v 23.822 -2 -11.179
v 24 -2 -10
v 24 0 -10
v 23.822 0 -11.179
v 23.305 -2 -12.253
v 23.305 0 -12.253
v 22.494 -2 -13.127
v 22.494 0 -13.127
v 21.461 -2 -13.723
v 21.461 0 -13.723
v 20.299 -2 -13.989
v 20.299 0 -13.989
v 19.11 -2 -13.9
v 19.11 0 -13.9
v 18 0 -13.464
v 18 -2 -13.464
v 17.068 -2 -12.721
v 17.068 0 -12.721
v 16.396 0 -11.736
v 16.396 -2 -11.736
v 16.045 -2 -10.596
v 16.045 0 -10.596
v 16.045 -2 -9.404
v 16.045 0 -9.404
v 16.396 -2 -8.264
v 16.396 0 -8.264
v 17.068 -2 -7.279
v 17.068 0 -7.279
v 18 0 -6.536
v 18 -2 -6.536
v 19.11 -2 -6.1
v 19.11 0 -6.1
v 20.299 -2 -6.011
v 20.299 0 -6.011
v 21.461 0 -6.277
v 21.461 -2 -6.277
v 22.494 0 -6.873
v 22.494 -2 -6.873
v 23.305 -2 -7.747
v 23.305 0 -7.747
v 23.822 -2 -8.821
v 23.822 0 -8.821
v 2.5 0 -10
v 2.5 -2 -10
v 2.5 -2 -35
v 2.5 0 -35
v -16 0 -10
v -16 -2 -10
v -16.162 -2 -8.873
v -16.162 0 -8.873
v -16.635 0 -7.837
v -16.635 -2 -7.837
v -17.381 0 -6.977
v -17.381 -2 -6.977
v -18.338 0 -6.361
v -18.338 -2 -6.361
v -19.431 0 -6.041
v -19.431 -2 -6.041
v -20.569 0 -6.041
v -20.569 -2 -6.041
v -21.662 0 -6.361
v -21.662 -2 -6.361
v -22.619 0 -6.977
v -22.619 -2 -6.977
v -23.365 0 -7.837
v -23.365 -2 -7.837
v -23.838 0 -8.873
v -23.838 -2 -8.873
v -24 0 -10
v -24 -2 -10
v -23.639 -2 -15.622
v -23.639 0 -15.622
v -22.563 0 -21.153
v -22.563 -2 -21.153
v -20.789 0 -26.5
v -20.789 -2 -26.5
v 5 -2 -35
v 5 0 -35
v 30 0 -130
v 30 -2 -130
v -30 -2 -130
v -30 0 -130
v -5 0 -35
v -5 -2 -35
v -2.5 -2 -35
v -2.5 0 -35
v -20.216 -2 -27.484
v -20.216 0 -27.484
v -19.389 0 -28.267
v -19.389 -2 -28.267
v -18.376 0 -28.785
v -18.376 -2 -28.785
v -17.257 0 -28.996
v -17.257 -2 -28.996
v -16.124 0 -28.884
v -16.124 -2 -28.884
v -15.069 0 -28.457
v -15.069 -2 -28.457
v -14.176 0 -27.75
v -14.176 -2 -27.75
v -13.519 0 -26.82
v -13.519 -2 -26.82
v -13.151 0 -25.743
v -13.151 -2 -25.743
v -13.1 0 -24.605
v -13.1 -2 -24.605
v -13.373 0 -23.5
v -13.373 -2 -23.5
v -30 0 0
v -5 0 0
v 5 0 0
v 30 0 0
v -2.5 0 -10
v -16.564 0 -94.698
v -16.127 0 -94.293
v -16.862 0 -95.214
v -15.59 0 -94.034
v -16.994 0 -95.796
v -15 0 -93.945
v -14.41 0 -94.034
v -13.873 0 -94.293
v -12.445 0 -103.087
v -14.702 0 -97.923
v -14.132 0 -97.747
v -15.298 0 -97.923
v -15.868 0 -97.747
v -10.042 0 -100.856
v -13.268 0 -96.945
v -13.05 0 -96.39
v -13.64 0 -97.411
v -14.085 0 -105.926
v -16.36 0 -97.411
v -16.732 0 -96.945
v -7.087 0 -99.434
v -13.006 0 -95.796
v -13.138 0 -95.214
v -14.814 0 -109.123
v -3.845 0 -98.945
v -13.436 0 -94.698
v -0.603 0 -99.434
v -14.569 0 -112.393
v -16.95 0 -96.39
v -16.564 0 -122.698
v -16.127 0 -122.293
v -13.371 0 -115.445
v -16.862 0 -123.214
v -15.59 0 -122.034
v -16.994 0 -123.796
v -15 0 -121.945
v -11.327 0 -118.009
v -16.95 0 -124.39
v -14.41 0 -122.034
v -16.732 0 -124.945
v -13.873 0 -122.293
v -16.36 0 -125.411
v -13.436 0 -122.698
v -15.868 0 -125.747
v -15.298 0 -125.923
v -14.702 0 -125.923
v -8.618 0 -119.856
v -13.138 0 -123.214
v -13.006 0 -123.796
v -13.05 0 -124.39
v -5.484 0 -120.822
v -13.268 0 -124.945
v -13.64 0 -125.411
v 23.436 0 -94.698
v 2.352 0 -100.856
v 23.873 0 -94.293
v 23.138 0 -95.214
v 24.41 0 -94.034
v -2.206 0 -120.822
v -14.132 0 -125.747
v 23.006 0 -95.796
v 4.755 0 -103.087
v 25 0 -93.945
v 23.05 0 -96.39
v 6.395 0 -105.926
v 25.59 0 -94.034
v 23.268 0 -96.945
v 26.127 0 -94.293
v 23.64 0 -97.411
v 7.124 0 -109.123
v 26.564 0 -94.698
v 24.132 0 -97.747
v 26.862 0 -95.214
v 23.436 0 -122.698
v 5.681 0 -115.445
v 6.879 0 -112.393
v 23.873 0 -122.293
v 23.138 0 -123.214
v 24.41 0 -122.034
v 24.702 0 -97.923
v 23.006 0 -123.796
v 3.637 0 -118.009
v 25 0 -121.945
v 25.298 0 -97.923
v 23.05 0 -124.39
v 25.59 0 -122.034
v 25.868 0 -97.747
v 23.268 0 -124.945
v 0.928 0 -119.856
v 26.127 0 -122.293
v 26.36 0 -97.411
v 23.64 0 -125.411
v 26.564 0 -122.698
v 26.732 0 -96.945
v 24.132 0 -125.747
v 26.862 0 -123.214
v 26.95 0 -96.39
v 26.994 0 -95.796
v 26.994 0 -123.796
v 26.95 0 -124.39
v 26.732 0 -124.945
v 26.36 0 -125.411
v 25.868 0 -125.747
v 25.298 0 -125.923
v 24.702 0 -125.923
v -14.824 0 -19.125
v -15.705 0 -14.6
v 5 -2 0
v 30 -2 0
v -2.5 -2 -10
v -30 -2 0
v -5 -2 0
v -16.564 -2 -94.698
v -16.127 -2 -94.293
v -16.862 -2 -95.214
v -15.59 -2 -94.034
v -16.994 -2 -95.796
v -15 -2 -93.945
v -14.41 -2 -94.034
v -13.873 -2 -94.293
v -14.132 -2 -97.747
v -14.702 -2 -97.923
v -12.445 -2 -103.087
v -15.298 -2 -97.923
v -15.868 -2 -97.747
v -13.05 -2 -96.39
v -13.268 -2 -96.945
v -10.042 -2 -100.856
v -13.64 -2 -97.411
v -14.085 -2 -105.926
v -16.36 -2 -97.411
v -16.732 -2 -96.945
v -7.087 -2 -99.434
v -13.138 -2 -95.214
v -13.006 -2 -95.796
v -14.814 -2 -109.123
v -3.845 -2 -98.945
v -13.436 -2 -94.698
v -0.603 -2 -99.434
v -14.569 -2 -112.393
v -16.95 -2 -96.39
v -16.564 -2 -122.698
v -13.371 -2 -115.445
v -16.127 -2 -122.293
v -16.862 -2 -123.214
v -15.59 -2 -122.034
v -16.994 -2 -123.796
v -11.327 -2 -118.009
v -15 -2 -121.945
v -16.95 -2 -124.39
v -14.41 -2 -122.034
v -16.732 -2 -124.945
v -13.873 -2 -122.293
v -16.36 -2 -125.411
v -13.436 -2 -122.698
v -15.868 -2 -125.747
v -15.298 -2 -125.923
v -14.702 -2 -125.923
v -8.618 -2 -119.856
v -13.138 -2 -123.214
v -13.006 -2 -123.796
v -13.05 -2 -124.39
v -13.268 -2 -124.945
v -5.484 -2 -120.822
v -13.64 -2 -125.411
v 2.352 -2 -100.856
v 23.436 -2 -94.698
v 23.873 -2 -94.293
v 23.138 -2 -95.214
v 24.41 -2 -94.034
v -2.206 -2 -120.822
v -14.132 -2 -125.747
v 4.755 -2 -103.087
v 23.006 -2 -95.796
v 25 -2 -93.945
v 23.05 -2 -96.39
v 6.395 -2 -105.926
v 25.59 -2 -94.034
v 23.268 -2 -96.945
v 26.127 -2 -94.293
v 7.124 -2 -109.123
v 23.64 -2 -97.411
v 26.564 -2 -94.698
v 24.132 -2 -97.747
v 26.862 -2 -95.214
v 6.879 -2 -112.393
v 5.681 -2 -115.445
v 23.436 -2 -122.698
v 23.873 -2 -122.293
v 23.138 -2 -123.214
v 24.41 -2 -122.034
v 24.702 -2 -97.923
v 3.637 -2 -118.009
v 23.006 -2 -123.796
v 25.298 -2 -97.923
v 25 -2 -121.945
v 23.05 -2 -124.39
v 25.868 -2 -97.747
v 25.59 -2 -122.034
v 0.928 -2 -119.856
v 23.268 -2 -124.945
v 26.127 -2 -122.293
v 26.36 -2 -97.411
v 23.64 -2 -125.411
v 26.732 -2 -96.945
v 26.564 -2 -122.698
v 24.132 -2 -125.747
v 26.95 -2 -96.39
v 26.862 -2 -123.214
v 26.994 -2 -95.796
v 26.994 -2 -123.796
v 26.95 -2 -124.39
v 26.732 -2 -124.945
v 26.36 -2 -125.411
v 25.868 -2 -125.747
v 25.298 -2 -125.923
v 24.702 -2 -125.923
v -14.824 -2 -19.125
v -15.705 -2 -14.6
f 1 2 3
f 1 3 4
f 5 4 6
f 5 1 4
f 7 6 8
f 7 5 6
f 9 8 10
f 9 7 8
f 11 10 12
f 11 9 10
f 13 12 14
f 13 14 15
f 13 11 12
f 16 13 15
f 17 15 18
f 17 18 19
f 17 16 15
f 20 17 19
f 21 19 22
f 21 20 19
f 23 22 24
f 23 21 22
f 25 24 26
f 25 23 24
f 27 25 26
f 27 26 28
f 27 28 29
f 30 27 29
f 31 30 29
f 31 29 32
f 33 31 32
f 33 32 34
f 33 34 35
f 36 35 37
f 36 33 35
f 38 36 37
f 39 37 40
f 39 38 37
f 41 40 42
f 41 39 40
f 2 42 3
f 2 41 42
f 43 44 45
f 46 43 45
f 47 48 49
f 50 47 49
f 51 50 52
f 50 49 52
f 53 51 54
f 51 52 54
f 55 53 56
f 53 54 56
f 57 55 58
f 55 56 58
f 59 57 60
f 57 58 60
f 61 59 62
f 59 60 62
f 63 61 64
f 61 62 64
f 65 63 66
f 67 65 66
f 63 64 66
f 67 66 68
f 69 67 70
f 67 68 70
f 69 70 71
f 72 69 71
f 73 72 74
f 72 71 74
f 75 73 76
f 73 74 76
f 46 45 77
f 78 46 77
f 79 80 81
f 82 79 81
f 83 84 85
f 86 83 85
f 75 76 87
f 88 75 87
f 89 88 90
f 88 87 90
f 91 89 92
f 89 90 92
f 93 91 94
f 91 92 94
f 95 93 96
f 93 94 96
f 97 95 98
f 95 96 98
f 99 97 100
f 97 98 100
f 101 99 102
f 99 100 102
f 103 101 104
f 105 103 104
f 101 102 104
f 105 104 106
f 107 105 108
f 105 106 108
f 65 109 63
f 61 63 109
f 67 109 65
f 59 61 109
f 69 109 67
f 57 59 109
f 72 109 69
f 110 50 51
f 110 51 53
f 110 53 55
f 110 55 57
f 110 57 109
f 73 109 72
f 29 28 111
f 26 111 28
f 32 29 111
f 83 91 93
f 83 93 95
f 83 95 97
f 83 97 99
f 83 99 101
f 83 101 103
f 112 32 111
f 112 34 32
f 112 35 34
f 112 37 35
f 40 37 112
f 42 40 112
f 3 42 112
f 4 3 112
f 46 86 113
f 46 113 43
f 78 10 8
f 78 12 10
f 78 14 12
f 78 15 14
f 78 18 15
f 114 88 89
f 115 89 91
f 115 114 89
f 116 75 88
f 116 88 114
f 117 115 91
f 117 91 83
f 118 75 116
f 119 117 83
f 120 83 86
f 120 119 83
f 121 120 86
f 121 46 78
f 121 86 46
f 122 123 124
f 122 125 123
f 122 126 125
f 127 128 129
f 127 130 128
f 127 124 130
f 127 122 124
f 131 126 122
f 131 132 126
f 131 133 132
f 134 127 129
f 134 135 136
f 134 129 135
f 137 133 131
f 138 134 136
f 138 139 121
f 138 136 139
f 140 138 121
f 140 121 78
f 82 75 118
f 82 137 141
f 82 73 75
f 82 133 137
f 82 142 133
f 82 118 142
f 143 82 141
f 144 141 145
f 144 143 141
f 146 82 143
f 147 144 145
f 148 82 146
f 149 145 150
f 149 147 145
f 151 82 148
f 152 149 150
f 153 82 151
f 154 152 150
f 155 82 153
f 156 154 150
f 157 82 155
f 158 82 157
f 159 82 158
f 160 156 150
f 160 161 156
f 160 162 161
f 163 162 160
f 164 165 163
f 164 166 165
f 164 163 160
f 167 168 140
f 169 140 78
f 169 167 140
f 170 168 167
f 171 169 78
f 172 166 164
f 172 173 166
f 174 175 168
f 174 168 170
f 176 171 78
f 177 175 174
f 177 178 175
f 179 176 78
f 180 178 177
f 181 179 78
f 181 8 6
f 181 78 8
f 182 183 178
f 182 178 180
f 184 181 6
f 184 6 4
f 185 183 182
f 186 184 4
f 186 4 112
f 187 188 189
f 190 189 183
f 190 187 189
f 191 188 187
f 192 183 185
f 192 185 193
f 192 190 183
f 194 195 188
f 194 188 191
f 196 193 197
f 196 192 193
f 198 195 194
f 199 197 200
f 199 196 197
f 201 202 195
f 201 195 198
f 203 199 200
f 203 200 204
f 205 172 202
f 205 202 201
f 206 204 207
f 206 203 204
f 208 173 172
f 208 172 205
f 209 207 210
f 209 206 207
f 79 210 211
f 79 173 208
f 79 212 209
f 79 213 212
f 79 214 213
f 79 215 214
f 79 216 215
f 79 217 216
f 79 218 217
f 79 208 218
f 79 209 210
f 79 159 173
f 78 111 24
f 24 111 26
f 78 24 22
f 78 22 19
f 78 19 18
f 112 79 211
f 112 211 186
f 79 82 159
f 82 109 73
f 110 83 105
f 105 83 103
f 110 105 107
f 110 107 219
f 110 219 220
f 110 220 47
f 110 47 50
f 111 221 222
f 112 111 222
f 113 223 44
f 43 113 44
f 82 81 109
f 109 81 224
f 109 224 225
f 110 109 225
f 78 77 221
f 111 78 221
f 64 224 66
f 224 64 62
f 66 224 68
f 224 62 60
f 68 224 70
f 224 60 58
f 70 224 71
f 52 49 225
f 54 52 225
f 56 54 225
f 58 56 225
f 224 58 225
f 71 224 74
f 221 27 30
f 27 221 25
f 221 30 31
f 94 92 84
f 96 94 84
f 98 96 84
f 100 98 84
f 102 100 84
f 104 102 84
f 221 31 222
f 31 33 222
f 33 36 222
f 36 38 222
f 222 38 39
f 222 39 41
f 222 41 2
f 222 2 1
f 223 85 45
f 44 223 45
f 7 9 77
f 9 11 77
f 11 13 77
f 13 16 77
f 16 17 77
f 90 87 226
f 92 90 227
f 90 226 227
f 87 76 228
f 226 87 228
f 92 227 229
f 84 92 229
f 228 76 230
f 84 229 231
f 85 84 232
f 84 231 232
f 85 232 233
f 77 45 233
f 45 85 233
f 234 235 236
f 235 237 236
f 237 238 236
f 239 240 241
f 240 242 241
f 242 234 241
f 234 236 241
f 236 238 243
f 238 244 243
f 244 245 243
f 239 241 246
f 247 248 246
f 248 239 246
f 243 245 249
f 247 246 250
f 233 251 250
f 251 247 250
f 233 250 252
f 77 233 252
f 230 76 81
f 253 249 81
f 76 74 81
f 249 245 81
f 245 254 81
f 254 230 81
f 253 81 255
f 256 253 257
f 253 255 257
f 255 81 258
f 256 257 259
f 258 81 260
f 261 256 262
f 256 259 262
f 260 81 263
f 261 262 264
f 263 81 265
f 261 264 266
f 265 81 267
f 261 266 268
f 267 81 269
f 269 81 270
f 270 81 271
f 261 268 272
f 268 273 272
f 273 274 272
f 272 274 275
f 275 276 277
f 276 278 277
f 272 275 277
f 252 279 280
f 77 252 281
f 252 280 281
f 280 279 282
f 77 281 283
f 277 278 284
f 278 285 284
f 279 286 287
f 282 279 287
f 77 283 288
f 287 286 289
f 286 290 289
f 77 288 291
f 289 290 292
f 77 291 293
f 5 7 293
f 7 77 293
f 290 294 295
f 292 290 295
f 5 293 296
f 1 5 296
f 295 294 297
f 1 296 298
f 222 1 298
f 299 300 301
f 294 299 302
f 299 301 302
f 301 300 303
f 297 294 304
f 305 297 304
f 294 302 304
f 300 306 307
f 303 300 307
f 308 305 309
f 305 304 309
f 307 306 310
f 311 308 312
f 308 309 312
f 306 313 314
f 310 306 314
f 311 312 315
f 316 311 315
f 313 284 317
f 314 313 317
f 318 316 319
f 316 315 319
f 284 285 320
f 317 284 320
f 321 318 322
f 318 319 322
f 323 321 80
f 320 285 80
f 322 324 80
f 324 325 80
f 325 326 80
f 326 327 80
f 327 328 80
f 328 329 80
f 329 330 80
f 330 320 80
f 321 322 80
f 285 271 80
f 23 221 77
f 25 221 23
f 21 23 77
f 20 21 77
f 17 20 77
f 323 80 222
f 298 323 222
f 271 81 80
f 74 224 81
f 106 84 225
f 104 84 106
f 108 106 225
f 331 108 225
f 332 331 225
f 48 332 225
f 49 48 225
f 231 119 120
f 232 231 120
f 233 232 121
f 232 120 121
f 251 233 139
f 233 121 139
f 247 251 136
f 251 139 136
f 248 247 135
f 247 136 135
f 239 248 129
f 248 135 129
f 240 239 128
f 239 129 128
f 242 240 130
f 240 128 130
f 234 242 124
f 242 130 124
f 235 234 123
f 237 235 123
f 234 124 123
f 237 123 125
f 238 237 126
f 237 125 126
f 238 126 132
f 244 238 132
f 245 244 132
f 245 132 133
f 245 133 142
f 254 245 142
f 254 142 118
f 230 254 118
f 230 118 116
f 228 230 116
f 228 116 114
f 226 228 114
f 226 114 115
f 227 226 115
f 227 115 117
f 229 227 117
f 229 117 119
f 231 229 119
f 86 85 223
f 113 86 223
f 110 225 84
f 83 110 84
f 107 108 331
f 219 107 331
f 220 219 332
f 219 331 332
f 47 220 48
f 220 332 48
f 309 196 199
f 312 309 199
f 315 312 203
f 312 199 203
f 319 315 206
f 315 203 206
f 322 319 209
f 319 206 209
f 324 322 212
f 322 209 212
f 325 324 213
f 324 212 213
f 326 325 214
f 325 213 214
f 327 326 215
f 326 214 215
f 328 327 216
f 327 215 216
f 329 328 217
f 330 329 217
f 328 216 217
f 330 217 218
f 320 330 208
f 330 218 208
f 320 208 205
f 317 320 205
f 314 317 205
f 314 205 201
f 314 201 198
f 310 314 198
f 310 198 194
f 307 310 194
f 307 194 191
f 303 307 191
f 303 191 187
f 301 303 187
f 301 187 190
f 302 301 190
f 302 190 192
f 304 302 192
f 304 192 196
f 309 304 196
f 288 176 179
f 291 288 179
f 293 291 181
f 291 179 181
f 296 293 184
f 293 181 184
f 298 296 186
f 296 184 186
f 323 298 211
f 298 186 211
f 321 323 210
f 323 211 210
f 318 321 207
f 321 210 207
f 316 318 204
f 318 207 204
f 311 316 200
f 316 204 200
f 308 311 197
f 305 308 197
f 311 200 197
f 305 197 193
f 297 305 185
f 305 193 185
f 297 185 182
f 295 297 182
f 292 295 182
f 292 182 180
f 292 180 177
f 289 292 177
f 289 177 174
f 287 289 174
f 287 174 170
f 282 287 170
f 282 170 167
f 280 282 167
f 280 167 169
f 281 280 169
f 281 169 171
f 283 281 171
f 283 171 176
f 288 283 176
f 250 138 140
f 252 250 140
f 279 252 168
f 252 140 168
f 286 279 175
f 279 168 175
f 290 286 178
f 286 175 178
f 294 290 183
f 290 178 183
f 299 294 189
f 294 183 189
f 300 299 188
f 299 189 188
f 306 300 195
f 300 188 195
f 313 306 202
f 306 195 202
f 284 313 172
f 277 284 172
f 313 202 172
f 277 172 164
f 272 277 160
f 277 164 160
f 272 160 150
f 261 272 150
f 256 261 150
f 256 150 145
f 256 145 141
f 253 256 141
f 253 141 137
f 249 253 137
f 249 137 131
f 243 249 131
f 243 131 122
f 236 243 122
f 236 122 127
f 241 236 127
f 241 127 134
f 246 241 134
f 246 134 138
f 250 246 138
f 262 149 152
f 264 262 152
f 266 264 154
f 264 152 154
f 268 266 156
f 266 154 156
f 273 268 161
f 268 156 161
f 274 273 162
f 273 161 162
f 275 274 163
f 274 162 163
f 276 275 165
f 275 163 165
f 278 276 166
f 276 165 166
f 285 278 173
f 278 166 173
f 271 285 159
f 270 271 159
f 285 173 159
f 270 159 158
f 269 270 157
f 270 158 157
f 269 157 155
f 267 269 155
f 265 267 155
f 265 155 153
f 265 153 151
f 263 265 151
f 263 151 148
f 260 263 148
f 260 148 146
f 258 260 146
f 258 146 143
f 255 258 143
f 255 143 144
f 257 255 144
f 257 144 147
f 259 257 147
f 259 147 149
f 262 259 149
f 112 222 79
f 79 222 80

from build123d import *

# Parameters (mm, degrees)
BRIDA_START           = -2
BRIDA_BASE1_OUTLINE_R = 4
BRIDA_BASE1_DEPTH     = 2
CROQUIS6_R            = 2
CROQUIS6_R_2          = 11
CORTAR_EXTRUIR1_DEPTH = 10


# Read off the part's stored shape, not the designer's step: Brida base1
with BuildPart() as part:
    # Brida base1 outline → Brida base1 (new body)
    with BuildSketch(Plane(origin=(0, 0, 0), x_dir=(1, 0, 0), z_dir=(0, 1, 0)).offset(BRIDA_START)):
        Polygon((5, 35), (5, 0), (30, 0), (30, 130), (-30, 130), (-30, 0), (-5, 0), (-5, 35), (-2.5, 35), (-2.5, 10), (2.5, 10), (2.5, 35), align=None)
        with BuildLine():
            ThreePointArc((-24, 10), (-23.18981381, 18.404759548), (-20.789091679, 26.5))
            ThreePointArc((-20.789091679, 26.5), (-15.580992435, 28.708099244), (-13.372893192, 23.5))
            ThreePointArc((-13.372893192, 23.5), (-15.33712039, 16.876621448), (-16, 10))
            ThreePointArc((-16, 10), (-20, 6), (-24, 10))
        make_face(mode=Mode.SUBTRACT)
        with Locations((20, 10)):
            Circle(BRIDA_BASE1_OUTLINE_R, mode=Mode.SUBTRACT)
    extrude(amount=BRIDA_BASE1_DEPTH)

    # Croquis6 → Cortar-Extruir1 (cut)
    with BuildSketch(Plane(origin=(0, 0, 0), x_dir=(1, 0, 0), z_dir=(0, 1, 0))):
        with Locations(Location((25, 123.945, 0), (0, 0, 270))):
            Circle(CROQUIS6_R)
        with Locations(Location((25, 95.945, 0), (0, 0, 270))):
            Circle(CROQUIS6_R)
        with Locations(Location((-15, 123.945, 0), (0, 0, 270))):
            Circle(CROQUIS6_R)
        with Locations(Location((-15, 95.945, 0), (0, 0, 270))):
            Circle(CROQUIS6_R)
        with Locations(Location((-3.845, 109.945, 0), (0, 0, 270))):
            Circle(CROQUIS6_R_2)
    extrude(amount=-CORTAR_EXTRUIR1_DEPTH, mode=Mode.SUBTRACT)


solid = part.part
